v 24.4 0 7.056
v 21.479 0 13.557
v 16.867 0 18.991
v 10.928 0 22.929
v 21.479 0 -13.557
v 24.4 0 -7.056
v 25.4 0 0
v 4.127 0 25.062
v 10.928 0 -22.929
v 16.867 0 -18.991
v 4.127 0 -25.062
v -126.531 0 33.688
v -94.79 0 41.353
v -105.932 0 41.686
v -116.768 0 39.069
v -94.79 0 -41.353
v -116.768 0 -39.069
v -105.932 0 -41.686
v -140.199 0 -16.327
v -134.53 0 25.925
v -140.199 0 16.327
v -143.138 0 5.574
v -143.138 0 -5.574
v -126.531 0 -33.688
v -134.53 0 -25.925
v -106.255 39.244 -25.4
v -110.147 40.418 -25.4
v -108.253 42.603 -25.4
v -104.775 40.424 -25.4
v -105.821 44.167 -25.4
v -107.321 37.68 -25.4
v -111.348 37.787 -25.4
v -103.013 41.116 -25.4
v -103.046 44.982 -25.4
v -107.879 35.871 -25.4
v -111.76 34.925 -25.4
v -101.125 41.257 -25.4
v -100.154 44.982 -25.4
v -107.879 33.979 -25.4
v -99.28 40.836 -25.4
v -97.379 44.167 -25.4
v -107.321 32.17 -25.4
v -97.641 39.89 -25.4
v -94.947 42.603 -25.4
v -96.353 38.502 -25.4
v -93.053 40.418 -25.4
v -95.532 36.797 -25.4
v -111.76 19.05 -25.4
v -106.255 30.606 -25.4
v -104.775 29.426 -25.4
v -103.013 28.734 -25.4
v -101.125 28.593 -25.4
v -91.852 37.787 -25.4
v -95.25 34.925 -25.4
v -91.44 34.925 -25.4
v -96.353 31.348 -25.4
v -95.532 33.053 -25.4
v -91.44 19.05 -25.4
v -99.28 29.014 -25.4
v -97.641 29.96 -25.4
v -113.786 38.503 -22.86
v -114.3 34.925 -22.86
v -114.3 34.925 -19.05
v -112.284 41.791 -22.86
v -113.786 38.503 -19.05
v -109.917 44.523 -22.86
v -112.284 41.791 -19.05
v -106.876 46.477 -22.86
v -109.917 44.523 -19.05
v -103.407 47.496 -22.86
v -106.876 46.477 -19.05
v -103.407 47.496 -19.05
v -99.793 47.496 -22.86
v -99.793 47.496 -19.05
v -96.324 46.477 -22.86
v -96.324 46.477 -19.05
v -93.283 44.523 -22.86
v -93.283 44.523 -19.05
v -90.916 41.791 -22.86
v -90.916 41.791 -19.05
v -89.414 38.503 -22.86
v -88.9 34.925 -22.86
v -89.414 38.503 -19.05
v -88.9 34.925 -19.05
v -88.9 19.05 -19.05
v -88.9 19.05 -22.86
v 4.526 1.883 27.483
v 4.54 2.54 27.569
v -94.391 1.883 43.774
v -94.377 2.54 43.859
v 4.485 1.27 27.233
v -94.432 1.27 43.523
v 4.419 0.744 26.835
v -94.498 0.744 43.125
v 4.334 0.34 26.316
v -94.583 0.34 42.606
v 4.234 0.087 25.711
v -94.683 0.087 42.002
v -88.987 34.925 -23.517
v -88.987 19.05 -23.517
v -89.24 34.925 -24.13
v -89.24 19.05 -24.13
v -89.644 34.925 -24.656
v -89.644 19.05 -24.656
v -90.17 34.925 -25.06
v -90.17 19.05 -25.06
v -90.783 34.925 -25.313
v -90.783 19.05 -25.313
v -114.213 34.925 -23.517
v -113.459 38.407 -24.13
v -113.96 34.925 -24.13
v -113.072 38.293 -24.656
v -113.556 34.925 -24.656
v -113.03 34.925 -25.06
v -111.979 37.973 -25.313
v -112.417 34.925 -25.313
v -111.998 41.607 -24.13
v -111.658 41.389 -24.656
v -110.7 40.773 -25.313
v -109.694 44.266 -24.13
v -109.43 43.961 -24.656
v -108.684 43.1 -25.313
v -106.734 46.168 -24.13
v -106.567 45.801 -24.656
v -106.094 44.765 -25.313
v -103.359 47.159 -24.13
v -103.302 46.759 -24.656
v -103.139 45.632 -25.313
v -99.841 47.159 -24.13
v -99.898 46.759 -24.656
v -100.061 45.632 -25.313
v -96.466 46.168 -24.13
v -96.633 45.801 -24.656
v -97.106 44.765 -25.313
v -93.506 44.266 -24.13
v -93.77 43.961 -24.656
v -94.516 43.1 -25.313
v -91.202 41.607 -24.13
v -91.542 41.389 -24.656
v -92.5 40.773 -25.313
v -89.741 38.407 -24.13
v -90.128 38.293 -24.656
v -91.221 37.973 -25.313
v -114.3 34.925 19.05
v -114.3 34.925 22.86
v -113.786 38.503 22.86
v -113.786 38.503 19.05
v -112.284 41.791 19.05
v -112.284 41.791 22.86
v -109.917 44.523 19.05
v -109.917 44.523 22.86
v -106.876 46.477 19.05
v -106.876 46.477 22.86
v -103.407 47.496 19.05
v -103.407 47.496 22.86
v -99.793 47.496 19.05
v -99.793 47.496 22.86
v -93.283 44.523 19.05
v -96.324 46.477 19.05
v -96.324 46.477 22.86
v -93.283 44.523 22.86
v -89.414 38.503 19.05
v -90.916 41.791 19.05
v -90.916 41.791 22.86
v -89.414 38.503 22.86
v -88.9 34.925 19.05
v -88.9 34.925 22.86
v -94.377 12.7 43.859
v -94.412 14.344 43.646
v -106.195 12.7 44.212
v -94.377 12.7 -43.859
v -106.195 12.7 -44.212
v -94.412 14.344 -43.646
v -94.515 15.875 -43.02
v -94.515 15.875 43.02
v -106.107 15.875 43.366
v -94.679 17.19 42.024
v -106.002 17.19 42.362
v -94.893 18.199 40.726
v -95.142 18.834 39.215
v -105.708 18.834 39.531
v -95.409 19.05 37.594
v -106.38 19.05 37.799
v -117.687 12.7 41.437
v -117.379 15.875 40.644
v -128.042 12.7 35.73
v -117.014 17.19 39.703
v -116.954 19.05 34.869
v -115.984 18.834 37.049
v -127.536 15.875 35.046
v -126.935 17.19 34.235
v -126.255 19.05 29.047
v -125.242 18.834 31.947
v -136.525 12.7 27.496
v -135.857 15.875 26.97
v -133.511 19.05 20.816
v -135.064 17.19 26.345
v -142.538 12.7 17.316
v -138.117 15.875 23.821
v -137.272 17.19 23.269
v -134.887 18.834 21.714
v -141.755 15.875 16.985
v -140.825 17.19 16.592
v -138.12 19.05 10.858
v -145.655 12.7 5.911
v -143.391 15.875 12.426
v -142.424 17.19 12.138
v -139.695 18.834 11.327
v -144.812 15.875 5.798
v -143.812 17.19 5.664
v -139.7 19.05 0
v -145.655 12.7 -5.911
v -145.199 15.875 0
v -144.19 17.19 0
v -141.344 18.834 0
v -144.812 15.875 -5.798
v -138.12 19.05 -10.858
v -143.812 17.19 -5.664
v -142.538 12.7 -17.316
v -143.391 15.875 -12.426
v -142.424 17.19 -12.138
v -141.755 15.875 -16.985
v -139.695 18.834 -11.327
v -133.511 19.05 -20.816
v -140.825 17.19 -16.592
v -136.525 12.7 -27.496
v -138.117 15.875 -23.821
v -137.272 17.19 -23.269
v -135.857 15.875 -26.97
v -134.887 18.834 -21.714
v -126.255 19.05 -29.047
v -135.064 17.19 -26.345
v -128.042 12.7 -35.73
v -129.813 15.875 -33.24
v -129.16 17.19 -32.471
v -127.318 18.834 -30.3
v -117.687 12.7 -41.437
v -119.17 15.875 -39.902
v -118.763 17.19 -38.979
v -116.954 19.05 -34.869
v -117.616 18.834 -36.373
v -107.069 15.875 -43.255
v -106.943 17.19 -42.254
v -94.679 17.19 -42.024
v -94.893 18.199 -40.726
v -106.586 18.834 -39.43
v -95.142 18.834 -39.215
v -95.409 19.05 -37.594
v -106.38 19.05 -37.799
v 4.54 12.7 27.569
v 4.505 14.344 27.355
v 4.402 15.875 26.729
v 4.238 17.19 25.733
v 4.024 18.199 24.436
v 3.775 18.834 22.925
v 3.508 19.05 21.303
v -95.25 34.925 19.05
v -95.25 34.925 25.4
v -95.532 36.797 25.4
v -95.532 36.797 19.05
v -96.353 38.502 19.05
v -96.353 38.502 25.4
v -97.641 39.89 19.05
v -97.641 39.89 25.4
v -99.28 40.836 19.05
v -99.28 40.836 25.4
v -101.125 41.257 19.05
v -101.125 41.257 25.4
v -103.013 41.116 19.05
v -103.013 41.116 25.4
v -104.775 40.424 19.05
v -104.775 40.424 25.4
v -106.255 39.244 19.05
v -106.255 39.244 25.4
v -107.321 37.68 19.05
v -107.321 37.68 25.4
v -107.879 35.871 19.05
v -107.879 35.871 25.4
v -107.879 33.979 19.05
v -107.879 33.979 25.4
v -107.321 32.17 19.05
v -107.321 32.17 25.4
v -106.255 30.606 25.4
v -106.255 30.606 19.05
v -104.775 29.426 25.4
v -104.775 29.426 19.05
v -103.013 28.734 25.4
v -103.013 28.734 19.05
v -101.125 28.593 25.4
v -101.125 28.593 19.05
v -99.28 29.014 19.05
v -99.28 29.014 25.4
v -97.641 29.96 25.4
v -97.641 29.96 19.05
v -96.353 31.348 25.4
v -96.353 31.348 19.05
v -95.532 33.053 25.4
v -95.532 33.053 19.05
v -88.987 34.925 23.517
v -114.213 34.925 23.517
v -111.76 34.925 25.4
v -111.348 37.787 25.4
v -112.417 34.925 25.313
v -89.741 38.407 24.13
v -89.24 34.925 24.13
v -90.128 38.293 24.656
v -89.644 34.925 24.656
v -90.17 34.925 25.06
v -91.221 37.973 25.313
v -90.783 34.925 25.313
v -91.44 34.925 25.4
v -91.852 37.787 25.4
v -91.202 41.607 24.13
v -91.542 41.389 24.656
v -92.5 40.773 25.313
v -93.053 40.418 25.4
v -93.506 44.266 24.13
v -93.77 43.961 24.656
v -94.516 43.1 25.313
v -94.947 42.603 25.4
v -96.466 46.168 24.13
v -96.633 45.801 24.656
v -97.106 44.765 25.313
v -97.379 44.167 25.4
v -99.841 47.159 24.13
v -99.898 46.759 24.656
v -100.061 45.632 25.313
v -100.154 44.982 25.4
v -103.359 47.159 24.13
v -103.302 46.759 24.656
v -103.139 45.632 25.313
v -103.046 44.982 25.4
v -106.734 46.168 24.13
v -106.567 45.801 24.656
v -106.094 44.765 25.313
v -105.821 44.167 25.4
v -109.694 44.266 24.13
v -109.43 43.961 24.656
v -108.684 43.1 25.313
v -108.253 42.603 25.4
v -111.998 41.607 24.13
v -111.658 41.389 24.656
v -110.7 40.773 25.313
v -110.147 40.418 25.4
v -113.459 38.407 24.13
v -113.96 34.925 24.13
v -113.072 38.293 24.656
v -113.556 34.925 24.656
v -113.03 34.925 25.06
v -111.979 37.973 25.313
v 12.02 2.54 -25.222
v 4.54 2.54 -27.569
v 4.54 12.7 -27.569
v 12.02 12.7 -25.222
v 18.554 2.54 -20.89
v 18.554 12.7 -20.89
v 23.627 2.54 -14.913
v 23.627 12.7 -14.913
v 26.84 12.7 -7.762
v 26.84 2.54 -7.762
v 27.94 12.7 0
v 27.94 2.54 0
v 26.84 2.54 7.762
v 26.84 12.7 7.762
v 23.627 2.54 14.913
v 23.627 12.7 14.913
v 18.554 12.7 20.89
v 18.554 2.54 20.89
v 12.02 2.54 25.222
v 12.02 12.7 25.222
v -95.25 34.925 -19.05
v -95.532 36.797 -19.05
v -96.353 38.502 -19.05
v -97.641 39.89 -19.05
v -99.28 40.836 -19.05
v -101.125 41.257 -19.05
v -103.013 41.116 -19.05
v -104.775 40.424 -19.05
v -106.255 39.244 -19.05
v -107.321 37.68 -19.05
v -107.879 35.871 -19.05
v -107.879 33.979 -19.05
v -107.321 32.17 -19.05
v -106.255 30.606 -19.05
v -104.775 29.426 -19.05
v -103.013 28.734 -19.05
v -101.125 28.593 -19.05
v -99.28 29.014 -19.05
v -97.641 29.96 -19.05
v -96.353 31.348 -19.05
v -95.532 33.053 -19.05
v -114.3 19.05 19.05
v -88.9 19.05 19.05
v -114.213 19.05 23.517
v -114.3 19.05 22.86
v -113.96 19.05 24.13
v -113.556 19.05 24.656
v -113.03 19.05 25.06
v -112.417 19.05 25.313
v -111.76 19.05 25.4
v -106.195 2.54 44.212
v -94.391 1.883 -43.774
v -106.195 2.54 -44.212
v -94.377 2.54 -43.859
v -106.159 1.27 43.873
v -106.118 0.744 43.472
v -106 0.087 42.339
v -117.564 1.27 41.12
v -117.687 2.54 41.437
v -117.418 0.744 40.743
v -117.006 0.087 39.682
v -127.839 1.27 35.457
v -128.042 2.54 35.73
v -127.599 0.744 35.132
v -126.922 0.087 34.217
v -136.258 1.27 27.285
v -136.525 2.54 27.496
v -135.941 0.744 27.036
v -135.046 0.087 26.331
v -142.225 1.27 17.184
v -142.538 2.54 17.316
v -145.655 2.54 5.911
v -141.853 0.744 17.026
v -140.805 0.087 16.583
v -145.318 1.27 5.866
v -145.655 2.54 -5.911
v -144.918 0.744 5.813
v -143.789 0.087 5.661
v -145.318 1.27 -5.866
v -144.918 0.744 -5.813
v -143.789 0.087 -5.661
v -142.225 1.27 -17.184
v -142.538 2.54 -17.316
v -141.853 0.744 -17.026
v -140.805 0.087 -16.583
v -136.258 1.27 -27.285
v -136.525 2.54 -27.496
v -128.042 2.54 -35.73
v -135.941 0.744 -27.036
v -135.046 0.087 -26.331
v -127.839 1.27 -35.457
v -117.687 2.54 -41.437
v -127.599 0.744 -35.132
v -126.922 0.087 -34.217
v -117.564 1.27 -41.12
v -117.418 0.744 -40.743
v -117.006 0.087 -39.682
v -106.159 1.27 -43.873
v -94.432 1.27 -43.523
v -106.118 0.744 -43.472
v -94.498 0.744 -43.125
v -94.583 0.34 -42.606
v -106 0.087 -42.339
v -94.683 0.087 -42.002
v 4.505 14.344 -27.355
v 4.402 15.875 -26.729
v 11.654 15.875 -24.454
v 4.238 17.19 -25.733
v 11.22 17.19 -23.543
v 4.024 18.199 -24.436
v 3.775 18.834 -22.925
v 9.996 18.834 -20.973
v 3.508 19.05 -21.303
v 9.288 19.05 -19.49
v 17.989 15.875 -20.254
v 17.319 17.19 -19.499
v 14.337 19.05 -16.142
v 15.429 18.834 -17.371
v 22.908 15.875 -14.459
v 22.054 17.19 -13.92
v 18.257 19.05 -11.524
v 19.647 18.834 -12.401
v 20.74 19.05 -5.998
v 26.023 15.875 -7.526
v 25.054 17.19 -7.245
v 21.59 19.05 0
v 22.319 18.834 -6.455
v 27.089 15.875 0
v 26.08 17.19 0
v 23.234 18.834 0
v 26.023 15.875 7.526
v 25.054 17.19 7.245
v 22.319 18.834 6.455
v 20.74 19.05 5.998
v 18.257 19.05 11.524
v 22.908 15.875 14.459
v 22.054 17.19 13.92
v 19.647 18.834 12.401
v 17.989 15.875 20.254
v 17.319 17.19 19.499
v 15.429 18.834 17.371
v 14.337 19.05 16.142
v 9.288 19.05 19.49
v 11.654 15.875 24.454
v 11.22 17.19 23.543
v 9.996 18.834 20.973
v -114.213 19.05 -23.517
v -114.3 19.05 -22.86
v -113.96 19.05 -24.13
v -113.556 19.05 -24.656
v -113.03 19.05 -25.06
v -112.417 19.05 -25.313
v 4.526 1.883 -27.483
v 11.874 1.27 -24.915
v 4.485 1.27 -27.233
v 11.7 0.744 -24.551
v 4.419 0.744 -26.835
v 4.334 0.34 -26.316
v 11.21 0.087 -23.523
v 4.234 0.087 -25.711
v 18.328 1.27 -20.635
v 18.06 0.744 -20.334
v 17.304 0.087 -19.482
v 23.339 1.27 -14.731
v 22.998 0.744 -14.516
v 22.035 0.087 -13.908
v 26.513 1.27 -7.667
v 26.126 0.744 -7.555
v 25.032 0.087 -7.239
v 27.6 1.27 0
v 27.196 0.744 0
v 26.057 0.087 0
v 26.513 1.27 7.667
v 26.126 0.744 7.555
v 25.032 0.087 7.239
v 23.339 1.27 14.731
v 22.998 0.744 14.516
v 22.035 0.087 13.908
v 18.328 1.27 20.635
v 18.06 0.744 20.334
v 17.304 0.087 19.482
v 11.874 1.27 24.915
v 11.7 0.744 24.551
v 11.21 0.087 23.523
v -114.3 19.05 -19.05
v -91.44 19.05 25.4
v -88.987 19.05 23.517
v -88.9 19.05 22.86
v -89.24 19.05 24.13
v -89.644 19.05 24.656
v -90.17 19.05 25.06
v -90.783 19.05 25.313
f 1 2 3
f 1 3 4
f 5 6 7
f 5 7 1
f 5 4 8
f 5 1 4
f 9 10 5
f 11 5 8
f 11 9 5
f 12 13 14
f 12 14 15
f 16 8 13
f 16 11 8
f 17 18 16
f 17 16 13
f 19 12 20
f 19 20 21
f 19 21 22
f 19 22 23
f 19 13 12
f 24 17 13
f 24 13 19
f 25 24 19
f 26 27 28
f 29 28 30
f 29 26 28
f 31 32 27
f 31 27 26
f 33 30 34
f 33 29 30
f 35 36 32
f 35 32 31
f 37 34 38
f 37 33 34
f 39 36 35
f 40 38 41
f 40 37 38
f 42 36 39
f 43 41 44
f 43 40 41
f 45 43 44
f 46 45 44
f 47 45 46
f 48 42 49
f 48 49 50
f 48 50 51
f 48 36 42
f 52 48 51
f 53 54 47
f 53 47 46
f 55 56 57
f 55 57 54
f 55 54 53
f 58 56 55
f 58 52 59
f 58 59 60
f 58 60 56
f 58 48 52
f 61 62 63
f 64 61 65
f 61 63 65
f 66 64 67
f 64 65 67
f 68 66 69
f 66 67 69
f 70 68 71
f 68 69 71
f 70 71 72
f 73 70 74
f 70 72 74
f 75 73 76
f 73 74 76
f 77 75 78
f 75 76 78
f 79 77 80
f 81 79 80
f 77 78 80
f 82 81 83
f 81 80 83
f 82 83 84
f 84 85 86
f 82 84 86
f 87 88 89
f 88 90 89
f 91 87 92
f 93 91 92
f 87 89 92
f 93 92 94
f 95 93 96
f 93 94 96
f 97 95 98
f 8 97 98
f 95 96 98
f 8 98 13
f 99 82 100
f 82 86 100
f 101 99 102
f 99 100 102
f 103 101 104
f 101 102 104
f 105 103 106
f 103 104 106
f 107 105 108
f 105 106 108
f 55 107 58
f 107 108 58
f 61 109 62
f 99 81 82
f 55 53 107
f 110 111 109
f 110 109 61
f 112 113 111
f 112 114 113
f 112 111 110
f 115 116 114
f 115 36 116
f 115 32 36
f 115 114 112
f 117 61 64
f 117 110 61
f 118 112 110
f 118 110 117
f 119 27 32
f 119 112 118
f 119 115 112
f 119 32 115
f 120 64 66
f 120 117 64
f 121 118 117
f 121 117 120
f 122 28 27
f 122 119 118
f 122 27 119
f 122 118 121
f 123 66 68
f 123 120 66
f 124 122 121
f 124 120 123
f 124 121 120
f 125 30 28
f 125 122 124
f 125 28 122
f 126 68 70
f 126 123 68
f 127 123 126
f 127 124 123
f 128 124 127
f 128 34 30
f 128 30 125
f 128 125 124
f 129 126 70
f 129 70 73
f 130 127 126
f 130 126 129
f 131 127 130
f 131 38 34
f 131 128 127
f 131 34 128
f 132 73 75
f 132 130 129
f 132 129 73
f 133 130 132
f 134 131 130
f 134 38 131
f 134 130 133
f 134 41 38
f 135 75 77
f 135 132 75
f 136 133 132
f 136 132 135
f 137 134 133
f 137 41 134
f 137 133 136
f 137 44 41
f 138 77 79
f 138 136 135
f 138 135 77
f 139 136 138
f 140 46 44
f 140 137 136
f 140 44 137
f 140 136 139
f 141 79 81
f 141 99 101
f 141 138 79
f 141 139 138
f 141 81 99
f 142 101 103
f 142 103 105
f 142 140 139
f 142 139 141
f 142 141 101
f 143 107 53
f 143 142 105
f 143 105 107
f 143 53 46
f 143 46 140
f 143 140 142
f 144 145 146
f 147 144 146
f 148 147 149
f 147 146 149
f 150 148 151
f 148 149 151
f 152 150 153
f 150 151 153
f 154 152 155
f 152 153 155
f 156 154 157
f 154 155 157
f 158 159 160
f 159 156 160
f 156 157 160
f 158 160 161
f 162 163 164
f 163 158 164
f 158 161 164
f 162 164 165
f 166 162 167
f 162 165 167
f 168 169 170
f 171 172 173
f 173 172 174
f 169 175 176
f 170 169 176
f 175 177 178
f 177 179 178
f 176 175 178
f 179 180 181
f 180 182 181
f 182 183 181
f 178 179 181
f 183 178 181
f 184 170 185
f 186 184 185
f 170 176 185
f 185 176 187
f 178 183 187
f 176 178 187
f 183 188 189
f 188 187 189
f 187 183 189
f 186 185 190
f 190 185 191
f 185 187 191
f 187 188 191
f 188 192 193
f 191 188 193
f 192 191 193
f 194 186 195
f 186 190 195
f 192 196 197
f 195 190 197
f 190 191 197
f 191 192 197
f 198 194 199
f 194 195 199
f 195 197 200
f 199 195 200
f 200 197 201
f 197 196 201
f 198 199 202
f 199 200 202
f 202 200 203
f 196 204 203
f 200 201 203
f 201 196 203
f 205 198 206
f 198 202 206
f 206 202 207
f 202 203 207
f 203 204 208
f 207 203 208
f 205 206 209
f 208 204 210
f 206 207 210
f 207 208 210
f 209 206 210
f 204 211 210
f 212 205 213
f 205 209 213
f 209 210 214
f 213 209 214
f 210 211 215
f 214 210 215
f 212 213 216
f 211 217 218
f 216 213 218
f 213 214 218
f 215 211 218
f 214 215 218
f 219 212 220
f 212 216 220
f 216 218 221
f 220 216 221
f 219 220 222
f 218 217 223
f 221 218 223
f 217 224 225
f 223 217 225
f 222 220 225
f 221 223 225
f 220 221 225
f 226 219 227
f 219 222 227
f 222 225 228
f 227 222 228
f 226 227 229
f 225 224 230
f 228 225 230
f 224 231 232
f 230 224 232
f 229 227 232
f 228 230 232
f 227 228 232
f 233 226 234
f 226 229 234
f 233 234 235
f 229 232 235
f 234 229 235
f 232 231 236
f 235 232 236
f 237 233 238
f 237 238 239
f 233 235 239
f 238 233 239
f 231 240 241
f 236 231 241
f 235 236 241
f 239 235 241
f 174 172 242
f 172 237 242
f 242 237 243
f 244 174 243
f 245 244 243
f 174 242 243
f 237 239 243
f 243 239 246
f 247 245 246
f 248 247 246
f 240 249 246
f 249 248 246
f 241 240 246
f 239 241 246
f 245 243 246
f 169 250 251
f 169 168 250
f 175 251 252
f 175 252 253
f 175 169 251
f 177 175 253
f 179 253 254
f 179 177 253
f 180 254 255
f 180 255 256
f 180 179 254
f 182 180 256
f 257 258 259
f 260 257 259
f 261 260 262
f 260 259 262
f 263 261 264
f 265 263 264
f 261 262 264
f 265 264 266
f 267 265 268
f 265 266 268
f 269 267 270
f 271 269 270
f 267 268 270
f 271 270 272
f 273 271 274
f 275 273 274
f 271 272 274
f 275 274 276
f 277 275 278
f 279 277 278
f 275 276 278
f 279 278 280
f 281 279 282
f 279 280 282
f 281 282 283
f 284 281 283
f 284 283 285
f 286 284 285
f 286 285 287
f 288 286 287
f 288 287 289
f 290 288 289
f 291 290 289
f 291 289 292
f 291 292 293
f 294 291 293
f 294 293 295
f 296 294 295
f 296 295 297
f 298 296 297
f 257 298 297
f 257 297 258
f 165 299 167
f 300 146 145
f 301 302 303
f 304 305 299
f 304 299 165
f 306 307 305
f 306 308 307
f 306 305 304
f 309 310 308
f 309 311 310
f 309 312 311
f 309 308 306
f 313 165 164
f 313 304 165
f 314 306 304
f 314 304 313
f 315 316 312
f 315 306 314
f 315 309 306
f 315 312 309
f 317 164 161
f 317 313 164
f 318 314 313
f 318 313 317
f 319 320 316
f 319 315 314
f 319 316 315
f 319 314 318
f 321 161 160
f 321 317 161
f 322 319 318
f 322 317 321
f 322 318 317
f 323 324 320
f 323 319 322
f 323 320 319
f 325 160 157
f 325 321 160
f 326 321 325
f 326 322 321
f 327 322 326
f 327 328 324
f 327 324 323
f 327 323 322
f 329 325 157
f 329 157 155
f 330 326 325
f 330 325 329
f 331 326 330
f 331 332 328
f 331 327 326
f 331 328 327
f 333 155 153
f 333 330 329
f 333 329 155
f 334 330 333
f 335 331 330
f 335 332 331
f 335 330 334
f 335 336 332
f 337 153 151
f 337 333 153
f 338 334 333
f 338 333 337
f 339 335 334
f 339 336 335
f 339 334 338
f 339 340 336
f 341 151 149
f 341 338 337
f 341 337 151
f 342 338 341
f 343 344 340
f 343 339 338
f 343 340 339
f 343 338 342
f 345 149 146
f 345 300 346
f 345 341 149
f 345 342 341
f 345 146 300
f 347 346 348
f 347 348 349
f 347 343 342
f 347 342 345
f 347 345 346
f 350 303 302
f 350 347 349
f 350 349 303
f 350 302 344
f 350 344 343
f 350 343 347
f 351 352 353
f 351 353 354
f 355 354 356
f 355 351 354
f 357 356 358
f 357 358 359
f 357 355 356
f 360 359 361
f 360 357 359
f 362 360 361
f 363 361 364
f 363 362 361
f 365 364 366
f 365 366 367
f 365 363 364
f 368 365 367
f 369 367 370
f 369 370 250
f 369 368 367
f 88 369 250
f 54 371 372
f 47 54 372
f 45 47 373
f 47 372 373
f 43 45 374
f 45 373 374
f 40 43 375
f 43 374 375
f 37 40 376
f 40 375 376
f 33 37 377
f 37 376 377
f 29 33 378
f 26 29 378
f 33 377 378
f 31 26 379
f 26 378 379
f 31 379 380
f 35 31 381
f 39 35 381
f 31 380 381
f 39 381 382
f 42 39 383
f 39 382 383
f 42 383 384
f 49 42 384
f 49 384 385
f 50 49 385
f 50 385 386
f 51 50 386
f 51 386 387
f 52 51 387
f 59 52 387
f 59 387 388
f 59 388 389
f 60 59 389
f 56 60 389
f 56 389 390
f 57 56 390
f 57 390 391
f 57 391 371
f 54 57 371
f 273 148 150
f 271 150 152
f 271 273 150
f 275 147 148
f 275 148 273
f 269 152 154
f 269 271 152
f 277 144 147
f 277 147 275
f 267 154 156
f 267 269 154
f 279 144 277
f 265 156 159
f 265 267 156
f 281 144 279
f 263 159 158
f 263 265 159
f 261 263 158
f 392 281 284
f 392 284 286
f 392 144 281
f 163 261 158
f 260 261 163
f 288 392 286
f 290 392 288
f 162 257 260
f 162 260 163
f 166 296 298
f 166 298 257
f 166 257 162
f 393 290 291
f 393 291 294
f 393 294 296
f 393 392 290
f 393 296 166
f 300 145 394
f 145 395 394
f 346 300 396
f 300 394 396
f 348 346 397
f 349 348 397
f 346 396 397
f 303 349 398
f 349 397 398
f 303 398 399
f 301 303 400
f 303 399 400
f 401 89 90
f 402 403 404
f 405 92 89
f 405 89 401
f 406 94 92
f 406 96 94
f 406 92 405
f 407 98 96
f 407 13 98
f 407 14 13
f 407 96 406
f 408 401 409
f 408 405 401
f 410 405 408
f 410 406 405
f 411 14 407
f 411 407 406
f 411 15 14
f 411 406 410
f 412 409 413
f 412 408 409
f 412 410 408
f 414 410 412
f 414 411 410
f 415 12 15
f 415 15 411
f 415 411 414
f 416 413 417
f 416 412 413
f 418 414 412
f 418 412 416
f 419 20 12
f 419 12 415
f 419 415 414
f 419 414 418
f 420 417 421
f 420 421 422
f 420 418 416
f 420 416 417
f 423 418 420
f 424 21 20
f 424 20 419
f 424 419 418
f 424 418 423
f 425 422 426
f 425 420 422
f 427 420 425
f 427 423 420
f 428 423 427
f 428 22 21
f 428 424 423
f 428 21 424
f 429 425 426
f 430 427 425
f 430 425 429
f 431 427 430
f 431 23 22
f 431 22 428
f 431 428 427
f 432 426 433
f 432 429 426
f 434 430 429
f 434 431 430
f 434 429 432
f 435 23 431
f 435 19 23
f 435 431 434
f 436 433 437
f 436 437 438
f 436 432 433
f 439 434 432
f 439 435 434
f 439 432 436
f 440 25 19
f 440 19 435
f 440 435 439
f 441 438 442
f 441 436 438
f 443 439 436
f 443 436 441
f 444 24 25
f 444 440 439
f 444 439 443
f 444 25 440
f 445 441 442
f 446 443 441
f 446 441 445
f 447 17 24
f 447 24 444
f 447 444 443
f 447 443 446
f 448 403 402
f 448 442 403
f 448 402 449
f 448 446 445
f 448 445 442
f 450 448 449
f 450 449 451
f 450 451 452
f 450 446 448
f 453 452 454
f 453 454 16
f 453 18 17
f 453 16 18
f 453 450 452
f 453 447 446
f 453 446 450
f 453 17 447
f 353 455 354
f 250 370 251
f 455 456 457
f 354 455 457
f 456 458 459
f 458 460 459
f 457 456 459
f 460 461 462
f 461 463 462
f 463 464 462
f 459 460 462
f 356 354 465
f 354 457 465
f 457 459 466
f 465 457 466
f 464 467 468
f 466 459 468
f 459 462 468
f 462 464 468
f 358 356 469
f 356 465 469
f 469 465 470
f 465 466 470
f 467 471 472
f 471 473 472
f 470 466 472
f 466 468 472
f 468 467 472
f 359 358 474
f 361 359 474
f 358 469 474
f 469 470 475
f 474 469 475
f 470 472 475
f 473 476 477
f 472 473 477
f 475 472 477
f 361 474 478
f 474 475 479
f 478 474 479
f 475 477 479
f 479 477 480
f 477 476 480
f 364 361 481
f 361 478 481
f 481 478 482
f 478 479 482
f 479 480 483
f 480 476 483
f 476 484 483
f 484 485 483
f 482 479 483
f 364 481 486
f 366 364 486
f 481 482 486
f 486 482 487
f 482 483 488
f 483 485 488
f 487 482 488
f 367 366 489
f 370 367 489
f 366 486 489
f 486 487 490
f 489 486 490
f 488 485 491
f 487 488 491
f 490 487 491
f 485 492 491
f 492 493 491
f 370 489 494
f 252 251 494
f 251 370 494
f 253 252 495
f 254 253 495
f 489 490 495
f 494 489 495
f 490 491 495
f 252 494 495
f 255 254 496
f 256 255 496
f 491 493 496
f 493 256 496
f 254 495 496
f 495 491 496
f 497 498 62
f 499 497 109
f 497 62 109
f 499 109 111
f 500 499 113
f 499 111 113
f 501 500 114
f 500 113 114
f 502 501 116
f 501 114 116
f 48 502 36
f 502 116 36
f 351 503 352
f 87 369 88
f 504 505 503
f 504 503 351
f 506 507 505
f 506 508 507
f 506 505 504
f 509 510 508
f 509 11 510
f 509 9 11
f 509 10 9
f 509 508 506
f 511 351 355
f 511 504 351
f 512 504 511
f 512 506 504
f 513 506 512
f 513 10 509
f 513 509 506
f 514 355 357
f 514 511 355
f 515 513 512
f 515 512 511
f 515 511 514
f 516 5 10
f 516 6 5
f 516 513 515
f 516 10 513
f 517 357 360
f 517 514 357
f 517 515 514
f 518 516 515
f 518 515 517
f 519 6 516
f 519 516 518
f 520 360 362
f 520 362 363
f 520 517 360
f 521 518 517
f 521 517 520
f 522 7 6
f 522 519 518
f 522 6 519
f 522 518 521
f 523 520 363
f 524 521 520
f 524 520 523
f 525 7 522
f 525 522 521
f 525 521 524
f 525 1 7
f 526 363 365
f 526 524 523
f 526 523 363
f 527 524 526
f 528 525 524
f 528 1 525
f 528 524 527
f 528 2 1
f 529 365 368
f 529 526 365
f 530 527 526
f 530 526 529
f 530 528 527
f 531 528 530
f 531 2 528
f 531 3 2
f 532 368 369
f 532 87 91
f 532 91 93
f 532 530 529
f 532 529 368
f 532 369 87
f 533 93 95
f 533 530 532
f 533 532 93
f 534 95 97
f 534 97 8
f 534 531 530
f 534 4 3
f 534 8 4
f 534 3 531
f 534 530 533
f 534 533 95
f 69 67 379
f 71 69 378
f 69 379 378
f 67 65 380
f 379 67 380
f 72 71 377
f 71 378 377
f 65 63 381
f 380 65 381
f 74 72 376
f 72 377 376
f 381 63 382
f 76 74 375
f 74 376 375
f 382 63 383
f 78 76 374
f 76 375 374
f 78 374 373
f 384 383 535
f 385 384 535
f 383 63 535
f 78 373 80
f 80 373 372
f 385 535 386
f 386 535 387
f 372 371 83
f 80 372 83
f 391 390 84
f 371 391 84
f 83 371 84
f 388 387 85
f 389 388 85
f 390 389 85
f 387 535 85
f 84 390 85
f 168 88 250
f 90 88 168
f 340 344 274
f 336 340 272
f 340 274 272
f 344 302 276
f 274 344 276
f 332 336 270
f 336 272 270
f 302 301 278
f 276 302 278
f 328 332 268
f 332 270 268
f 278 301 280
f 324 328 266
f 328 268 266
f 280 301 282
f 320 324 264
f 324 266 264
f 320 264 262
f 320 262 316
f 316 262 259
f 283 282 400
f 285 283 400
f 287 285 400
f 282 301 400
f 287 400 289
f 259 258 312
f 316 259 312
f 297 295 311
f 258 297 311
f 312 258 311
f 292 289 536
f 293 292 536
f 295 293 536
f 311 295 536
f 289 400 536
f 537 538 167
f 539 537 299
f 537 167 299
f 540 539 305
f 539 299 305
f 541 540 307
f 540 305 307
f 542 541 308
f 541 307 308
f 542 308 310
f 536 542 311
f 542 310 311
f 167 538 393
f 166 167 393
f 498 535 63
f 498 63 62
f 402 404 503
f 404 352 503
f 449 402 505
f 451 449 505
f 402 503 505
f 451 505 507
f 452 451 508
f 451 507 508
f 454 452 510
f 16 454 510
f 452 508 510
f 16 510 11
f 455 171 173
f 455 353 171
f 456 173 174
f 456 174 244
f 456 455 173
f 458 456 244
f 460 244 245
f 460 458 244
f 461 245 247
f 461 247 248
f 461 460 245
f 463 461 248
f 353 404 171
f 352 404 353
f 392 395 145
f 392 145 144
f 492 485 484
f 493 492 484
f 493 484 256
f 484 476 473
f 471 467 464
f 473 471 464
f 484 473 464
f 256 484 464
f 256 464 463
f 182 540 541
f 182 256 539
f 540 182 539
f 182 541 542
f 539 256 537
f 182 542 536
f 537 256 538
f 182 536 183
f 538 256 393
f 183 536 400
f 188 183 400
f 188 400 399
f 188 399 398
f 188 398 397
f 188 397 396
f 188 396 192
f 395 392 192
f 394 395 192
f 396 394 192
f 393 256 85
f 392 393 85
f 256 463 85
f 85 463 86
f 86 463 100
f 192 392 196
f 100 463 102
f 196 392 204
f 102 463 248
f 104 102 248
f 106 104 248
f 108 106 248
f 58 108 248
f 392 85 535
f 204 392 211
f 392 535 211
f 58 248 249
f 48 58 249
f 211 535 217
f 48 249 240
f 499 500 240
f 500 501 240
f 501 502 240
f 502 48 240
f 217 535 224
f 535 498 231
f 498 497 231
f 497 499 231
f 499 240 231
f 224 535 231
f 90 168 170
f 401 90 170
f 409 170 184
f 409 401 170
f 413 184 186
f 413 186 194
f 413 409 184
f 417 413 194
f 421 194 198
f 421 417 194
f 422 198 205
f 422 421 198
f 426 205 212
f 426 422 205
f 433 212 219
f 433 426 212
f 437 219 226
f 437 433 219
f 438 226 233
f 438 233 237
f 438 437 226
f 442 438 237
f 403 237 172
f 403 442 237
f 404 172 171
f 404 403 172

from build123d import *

# Parameters (mm, degrees)
BOSS_EXTRUDE1_DEPTH = 19.05
SKETCH2_W           = 25.4
SKETCH2_H           = 6.35
BOSS_EXTRUDE2_DEPTH = 38.1
SKETCH3_R           = 6.35
CUT_EXTRUDE1_DEPTH  = 172.685024099
FILLET1_R           = 6.35
FILLET2_R           = 2.54
FILLET3_R           = 2.54


with BuildPart() as part:
    # Sketch1 → Boss-Extrude1 (new body)
    with BuildSketch(Plane(origin=(0, 0, 0), x_dir=(1, 0, 0), z_dir=(0, 1, 0))):
        with BuildLine():
            Line((-94.376875, 43.859194763), (4.54025, 27.568636708))
            ThreePointArc((4.54025, 27.568636708), (27.94, 0), (4.54025, -27.568636708))
            Line((4.54025, -27.568636708), (-94.376875, -43.859194763))
            ThreePointArc((-94.376875, -43.859194763), (-146.05, 0), (-94.376875, 43.859194763))
        make_face()
    extrude(amount=BOSS_EXTRUDE1_DEPTH)

    # Sketch2 → Boss-Extrude2 (add)
    with BuildSketch(Plane(origin=(0, 19.05, 0), x_dir=(1, 0, 0), z_dir=(0, 1, 0))):
        with Locations((-101.6, 22.225)):
            Rectangle(SKETCH2_W, SKETCH2_H)
        with Locations((-101.6, -22.225)):
            Rectangle(SKETCH2_W, SKETCH2_H)
    extrude(amount=BOSS_EXTRUDE2_DEPTH)

    # Sketch3 → Cut-Extrude1 (cut, through all)
    with BuildSketch(Plane.XY.offset(25.4)):
        with BuildLine():
            Line((-114.3, 57.15), (-114.3, 34.925))
            ThreePointArc((-114.3, 34.925), (-101.6, 47.625), (-88.9, 34.925))
            Line((-88.9, 34.925), (-88.9, 57.15))
            Line((-88.9, 57.15), (-114.3, 57.15))
        make_face()
        with Locations((-101.6, 34.925)):
            Circle(SKETCH3_R)
    extrude(amount=-CUT_EXTRUDE1_DEPTH, mode=Mode.SUBTRACT)

    # Fillet1
    fillet1_edges = [part.edges().sort_by_distance(p)[0] for p in [
        (27.94, 19.05, 0),
        (-44.9183125, 19.05, -35.713915735),
        (-146.05, 19.05, 0),
        (-44.9183125, 19.05, 35.713915735),
    ]]
    fillet(fillet1_edges, radius=FILLET1_R)

    # Fillet2
    fillet2_edges = [part.edges().sort_by_distance(p)[0] for p in [
        (-44.9183125, 0, -35.713915735),
        (27.94, 0, 0),
        (-44.9183125, 0, 35.713915735),
        (-146.05, 0, 0),
    ]]
    fillet(fillet2_edges, radius=FILLET2_R)

    # Fillet3
    fillet3_edges = [part.edges().sort_by_distance(p)[0] for p in [
        (-88.9, 26.9875, 25.4),
        (-114.3, 26.9875, 25.4),
        (-114.3, 26.9875, -25.4),
        (-88.9, 26.9875, -25.4),
        (-101.6, 47.625, -25.4),
        (-101.6, 47.625, 25.4),
    ]]
    fillet(fillet3_edges, radius=FILLET3_R)


solid = part.part
